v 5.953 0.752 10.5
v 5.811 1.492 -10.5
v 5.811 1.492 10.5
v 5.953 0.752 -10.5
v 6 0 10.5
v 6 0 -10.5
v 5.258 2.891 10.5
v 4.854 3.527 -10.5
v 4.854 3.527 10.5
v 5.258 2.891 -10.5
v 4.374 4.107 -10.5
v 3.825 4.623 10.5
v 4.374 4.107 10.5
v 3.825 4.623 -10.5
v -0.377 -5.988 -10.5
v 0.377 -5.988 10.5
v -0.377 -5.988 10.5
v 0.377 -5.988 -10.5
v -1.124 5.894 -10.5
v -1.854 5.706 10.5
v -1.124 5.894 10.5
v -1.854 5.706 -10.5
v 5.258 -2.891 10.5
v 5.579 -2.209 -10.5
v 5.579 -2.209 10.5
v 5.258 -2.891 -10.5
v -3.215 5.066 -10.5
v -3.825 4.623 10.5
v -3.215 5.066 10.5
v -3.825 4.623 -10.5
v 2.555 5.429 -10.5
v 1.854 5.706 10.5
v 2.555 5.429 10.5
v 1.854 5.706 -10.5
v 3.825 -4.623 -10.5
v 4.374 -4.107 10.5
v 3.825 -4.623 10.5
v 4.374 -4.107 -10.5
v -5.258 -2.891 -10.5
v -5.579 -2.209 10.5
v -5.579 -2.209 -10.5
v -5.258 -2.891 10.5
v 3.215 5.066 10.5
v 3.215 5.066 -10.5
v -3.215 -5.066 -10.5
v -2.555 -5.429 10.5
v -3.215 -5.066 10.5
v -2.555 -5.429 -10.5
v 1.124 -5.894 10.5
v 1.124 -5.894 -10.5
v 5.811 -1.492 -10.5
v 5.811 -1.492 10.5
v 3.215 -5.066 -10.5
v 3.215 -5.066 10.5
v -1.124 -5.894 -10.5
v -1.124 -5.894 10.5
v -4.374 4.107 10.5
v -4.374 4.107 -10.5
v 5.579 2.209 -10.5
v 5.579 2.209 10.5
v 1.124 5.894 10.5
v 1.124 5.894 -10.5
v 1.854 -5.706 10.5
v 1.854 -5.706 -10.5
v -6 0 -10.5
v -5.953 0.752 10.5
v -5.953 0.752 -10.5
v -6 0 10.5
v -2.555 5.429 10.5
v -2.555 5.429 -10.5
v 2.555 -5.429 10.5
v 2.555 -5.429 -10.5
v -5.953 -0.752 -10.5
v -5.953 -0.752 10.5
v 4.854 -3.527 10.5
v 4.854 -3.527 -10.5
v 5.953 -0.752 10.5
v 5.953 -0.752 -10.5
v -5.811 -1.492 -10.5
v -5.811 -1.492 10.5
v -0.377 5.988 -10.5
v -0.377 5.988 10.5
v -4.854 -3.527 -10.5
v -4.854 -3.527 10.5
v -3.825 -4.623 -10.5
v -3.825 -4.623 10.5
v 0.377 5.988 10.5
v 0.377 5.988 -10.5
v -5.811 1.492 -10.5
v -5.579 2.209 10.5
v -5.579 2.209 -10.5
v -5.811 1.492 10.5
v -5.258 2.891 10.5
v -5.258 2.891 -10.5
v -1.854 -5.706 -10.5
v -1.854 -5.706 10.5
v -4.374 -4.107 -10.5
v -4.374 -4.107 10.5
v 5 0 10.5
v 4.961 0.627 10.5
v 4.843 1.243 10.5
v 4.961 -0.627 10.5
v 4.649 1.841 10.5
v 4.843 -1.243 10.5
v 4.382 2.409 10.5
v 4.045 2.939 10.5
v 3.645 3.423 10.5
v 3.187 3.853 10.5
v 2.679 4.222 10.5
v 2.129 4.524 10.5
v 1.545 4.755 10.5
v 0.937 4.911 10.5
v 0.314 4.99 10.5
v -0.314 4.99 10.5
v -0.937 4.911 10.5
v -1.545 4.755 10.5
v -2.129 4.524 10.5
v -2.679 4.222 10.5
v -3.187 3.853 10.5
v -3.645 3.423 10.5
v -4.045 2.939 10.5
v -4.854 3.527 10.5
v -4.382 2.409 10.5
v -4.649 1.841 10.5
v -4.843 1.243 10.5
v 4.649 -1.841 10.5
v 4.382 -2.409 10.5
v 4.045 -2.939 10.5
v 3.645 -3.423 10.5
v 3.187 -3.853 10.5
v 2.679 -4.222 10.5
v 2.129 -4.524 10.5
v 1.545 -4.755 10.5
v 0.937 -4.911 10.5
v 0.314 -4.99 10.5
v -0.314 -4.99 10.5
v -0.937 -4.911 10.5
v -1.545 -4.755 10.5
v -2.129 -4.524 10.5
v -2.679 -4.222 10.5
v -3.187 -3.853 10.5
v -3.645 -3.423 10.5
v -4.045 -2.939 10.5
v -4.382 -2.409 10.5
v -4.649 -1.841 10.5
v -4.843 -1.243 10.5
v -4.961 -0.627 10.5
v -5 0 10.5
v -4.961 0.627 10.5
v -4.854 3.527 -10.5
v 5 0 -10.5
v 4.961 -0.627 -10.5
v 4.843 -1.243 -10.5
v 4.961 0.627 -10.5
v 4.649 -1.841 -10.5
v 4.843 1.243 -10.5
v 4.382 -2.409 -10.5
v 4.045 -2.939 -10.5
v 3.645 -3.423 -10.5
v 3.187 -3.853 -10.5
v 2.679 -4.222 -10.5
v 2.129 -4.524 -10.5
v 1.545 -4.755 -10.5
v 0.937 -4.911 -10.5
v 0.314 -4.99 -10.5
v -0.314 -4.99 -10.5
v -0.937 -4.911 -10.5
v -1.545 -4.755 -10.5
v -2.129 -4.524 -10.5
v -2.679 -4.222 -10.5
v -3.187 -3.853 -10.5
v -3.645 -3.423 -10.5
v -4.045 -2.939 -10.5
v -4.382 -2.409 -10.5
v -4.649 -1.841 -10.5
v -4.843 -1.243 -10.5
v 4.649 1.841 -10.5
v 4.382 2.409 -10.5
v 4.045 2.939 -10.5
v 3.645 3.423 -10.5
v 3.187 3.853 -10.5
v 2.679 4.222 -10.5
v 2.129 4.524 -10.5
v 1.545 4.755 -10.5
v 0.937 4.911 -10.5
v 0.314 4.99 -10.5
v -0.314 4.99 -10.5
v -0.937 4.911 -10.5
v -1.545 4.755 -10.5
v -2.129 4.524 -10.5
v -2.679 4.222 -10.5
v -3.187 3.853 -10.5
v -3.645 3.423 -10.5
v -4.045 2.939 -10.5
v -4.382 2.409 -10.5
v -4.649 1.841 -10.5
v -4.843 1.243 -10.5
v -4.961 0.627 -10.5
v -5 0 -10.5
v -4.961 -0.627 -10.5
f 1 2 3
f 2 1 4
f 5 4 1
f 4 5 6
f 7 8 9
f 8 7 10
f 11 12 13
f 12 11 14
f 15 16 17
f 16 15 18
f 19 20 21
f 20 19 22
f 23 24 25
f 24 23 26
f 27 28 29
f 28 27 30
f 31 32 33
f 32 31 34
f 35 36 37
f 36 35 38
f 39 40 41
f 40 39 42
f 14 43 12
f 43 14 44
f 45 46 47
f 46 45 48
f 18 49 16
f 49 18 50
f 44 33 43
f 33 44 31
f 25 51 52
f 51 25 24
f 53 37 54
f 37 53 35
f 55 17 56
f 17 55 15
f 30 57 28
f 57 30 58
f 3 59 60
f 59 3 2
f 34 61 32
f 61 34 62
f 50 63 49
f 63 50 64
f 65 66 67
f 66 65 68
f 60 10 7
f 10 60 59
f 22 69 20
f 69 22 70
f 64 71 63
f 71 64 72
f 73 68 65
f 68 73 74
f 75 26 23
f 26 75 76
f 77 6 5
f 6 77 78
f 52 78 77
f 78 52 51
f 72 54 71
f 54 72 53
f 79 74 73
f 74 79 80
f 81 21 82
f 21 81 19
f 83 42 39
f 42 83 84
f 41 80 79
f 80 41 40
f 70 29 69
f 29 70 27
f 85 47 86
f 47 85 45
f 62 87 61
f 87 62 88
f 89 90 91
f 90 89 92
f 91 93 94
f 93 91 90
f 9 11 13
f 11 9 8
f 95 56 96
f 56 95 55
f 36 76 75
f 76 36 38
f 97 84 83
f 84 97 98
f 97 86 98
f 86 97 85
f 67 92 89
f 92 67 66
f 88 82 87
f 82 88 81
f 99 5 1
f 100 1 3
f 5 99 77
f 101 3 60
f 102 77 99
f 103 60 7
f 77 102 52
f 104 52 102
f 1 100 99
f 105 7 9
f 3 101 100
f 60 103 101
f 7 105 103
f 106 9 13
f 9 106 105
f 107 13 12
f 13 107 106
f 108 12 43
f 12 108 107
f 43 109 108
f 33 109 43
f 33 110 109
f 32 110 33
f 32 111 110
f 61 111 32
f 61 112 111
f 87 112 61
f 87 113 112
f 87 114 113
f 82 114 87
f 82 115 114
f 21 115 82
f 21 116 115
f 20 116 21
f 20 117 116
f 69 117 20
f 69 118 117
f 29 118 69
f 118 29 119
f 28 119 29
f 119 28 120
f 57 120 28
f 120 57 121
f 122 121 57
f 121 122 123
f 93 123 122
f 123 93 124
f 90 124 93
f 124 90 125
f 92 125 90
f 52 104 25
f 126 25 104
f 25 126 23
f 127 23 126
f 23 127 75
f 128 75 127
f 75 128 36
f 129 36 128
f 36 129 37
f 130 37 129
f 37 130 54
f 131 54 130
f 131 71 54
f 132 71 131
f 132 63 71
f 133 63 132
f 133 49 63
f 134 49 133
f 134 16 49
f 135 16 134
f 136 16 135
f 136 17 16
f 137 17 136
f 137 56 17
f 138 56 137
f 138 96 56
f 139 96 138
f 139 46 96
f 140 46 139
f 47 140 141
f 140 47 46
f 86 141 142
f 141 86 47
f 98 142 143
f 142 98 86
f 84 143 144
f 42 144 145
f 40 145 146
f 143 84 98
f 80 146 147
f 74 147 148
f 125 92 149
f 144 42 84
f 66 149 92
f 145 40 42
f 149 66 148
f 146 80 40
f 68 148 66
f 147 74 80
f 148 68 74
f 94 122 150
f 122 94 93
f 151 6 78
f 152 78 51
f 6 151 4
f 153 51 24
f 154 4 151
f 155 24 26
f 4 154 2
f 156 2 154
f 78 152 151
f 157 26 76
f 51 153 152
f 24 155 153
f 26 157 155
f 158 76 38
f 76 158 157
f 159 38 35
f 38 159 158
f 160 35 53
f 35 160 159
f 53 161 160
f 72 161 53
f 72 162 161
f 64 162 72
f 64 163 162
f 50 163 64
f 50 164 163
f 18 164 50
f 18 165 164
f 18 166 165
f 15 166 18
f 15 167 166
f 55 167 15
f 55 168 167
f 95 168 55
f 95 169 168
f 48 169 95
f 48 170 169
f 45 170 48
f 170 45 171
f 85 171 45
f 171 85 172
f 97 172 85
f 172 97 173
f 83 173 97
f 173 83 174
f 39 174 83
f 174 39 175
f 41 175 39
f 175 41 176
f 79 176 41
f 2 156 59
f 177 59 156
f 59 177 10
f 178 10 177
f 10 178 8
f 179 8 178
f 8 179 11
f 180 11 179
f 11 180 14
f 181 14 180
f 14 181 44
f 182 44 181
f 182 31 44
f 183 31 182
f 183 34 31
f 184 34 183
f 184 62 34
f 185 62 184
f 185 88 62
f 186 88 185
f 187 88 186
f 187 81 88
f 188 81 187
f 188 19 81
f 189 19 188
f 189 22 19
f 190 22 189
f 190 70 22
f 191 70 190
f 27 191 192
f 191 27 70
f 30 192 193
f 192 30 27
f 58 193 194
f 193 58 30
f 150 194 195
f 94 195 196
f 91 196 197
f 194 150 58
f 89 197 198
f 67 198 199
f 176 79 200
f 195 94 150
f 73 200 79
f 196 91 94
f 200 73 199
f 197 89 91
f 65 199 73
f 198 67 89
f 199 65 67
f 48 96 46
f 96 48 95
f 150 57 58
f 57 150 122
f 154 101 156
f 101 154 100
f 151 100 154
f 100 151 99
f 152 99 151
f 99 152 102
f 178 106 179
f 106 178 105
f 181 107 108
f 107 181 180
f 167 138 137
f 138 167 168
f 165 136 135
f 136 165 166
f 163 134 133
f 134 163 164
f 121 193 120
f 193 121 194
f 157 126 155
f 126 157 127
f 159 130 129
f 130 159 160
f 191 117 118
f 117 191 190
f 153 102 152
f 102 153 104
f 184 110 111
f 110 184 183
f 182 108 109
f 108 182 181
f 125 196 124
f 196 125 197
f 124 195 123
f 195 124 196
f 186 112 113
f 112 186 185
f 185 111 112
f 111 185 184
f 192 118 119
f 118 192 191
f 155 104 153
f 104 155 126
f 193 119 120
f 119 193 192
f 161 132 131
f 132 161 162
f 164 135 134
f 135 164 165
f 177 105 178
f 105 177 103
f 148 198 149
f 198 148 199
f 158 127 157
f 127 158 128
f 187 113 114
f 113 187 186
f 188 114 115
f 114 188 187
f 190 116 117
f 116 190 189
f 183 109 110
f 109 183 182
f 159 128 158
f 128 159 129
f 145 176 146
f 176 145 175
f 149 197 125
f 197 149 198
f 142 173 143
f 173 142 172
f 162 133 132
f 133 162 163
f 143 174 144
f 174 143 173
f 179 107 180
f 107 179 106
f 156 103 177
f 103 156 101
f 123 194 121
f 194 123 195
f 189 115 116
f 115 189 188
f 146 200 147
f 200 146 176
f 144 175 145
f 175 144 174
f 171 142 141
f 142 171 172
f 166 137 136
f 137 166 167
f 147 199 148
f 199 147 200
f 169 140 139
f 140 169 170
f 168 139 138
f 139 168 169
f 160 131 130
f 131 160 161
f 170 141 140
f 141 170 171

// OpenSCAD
$fn = 50;


difference() {
	union() {
		translate(v = [0, 0, -10.5000000000]) {
			cylinder(h = 21, r = 6.0000000000);
		}
	}
	union() {
		translate(v = [0, 0, -100.0000000000]) {
			cylinder(h = 200, r = 5.0000000000);
		}
	}
}
